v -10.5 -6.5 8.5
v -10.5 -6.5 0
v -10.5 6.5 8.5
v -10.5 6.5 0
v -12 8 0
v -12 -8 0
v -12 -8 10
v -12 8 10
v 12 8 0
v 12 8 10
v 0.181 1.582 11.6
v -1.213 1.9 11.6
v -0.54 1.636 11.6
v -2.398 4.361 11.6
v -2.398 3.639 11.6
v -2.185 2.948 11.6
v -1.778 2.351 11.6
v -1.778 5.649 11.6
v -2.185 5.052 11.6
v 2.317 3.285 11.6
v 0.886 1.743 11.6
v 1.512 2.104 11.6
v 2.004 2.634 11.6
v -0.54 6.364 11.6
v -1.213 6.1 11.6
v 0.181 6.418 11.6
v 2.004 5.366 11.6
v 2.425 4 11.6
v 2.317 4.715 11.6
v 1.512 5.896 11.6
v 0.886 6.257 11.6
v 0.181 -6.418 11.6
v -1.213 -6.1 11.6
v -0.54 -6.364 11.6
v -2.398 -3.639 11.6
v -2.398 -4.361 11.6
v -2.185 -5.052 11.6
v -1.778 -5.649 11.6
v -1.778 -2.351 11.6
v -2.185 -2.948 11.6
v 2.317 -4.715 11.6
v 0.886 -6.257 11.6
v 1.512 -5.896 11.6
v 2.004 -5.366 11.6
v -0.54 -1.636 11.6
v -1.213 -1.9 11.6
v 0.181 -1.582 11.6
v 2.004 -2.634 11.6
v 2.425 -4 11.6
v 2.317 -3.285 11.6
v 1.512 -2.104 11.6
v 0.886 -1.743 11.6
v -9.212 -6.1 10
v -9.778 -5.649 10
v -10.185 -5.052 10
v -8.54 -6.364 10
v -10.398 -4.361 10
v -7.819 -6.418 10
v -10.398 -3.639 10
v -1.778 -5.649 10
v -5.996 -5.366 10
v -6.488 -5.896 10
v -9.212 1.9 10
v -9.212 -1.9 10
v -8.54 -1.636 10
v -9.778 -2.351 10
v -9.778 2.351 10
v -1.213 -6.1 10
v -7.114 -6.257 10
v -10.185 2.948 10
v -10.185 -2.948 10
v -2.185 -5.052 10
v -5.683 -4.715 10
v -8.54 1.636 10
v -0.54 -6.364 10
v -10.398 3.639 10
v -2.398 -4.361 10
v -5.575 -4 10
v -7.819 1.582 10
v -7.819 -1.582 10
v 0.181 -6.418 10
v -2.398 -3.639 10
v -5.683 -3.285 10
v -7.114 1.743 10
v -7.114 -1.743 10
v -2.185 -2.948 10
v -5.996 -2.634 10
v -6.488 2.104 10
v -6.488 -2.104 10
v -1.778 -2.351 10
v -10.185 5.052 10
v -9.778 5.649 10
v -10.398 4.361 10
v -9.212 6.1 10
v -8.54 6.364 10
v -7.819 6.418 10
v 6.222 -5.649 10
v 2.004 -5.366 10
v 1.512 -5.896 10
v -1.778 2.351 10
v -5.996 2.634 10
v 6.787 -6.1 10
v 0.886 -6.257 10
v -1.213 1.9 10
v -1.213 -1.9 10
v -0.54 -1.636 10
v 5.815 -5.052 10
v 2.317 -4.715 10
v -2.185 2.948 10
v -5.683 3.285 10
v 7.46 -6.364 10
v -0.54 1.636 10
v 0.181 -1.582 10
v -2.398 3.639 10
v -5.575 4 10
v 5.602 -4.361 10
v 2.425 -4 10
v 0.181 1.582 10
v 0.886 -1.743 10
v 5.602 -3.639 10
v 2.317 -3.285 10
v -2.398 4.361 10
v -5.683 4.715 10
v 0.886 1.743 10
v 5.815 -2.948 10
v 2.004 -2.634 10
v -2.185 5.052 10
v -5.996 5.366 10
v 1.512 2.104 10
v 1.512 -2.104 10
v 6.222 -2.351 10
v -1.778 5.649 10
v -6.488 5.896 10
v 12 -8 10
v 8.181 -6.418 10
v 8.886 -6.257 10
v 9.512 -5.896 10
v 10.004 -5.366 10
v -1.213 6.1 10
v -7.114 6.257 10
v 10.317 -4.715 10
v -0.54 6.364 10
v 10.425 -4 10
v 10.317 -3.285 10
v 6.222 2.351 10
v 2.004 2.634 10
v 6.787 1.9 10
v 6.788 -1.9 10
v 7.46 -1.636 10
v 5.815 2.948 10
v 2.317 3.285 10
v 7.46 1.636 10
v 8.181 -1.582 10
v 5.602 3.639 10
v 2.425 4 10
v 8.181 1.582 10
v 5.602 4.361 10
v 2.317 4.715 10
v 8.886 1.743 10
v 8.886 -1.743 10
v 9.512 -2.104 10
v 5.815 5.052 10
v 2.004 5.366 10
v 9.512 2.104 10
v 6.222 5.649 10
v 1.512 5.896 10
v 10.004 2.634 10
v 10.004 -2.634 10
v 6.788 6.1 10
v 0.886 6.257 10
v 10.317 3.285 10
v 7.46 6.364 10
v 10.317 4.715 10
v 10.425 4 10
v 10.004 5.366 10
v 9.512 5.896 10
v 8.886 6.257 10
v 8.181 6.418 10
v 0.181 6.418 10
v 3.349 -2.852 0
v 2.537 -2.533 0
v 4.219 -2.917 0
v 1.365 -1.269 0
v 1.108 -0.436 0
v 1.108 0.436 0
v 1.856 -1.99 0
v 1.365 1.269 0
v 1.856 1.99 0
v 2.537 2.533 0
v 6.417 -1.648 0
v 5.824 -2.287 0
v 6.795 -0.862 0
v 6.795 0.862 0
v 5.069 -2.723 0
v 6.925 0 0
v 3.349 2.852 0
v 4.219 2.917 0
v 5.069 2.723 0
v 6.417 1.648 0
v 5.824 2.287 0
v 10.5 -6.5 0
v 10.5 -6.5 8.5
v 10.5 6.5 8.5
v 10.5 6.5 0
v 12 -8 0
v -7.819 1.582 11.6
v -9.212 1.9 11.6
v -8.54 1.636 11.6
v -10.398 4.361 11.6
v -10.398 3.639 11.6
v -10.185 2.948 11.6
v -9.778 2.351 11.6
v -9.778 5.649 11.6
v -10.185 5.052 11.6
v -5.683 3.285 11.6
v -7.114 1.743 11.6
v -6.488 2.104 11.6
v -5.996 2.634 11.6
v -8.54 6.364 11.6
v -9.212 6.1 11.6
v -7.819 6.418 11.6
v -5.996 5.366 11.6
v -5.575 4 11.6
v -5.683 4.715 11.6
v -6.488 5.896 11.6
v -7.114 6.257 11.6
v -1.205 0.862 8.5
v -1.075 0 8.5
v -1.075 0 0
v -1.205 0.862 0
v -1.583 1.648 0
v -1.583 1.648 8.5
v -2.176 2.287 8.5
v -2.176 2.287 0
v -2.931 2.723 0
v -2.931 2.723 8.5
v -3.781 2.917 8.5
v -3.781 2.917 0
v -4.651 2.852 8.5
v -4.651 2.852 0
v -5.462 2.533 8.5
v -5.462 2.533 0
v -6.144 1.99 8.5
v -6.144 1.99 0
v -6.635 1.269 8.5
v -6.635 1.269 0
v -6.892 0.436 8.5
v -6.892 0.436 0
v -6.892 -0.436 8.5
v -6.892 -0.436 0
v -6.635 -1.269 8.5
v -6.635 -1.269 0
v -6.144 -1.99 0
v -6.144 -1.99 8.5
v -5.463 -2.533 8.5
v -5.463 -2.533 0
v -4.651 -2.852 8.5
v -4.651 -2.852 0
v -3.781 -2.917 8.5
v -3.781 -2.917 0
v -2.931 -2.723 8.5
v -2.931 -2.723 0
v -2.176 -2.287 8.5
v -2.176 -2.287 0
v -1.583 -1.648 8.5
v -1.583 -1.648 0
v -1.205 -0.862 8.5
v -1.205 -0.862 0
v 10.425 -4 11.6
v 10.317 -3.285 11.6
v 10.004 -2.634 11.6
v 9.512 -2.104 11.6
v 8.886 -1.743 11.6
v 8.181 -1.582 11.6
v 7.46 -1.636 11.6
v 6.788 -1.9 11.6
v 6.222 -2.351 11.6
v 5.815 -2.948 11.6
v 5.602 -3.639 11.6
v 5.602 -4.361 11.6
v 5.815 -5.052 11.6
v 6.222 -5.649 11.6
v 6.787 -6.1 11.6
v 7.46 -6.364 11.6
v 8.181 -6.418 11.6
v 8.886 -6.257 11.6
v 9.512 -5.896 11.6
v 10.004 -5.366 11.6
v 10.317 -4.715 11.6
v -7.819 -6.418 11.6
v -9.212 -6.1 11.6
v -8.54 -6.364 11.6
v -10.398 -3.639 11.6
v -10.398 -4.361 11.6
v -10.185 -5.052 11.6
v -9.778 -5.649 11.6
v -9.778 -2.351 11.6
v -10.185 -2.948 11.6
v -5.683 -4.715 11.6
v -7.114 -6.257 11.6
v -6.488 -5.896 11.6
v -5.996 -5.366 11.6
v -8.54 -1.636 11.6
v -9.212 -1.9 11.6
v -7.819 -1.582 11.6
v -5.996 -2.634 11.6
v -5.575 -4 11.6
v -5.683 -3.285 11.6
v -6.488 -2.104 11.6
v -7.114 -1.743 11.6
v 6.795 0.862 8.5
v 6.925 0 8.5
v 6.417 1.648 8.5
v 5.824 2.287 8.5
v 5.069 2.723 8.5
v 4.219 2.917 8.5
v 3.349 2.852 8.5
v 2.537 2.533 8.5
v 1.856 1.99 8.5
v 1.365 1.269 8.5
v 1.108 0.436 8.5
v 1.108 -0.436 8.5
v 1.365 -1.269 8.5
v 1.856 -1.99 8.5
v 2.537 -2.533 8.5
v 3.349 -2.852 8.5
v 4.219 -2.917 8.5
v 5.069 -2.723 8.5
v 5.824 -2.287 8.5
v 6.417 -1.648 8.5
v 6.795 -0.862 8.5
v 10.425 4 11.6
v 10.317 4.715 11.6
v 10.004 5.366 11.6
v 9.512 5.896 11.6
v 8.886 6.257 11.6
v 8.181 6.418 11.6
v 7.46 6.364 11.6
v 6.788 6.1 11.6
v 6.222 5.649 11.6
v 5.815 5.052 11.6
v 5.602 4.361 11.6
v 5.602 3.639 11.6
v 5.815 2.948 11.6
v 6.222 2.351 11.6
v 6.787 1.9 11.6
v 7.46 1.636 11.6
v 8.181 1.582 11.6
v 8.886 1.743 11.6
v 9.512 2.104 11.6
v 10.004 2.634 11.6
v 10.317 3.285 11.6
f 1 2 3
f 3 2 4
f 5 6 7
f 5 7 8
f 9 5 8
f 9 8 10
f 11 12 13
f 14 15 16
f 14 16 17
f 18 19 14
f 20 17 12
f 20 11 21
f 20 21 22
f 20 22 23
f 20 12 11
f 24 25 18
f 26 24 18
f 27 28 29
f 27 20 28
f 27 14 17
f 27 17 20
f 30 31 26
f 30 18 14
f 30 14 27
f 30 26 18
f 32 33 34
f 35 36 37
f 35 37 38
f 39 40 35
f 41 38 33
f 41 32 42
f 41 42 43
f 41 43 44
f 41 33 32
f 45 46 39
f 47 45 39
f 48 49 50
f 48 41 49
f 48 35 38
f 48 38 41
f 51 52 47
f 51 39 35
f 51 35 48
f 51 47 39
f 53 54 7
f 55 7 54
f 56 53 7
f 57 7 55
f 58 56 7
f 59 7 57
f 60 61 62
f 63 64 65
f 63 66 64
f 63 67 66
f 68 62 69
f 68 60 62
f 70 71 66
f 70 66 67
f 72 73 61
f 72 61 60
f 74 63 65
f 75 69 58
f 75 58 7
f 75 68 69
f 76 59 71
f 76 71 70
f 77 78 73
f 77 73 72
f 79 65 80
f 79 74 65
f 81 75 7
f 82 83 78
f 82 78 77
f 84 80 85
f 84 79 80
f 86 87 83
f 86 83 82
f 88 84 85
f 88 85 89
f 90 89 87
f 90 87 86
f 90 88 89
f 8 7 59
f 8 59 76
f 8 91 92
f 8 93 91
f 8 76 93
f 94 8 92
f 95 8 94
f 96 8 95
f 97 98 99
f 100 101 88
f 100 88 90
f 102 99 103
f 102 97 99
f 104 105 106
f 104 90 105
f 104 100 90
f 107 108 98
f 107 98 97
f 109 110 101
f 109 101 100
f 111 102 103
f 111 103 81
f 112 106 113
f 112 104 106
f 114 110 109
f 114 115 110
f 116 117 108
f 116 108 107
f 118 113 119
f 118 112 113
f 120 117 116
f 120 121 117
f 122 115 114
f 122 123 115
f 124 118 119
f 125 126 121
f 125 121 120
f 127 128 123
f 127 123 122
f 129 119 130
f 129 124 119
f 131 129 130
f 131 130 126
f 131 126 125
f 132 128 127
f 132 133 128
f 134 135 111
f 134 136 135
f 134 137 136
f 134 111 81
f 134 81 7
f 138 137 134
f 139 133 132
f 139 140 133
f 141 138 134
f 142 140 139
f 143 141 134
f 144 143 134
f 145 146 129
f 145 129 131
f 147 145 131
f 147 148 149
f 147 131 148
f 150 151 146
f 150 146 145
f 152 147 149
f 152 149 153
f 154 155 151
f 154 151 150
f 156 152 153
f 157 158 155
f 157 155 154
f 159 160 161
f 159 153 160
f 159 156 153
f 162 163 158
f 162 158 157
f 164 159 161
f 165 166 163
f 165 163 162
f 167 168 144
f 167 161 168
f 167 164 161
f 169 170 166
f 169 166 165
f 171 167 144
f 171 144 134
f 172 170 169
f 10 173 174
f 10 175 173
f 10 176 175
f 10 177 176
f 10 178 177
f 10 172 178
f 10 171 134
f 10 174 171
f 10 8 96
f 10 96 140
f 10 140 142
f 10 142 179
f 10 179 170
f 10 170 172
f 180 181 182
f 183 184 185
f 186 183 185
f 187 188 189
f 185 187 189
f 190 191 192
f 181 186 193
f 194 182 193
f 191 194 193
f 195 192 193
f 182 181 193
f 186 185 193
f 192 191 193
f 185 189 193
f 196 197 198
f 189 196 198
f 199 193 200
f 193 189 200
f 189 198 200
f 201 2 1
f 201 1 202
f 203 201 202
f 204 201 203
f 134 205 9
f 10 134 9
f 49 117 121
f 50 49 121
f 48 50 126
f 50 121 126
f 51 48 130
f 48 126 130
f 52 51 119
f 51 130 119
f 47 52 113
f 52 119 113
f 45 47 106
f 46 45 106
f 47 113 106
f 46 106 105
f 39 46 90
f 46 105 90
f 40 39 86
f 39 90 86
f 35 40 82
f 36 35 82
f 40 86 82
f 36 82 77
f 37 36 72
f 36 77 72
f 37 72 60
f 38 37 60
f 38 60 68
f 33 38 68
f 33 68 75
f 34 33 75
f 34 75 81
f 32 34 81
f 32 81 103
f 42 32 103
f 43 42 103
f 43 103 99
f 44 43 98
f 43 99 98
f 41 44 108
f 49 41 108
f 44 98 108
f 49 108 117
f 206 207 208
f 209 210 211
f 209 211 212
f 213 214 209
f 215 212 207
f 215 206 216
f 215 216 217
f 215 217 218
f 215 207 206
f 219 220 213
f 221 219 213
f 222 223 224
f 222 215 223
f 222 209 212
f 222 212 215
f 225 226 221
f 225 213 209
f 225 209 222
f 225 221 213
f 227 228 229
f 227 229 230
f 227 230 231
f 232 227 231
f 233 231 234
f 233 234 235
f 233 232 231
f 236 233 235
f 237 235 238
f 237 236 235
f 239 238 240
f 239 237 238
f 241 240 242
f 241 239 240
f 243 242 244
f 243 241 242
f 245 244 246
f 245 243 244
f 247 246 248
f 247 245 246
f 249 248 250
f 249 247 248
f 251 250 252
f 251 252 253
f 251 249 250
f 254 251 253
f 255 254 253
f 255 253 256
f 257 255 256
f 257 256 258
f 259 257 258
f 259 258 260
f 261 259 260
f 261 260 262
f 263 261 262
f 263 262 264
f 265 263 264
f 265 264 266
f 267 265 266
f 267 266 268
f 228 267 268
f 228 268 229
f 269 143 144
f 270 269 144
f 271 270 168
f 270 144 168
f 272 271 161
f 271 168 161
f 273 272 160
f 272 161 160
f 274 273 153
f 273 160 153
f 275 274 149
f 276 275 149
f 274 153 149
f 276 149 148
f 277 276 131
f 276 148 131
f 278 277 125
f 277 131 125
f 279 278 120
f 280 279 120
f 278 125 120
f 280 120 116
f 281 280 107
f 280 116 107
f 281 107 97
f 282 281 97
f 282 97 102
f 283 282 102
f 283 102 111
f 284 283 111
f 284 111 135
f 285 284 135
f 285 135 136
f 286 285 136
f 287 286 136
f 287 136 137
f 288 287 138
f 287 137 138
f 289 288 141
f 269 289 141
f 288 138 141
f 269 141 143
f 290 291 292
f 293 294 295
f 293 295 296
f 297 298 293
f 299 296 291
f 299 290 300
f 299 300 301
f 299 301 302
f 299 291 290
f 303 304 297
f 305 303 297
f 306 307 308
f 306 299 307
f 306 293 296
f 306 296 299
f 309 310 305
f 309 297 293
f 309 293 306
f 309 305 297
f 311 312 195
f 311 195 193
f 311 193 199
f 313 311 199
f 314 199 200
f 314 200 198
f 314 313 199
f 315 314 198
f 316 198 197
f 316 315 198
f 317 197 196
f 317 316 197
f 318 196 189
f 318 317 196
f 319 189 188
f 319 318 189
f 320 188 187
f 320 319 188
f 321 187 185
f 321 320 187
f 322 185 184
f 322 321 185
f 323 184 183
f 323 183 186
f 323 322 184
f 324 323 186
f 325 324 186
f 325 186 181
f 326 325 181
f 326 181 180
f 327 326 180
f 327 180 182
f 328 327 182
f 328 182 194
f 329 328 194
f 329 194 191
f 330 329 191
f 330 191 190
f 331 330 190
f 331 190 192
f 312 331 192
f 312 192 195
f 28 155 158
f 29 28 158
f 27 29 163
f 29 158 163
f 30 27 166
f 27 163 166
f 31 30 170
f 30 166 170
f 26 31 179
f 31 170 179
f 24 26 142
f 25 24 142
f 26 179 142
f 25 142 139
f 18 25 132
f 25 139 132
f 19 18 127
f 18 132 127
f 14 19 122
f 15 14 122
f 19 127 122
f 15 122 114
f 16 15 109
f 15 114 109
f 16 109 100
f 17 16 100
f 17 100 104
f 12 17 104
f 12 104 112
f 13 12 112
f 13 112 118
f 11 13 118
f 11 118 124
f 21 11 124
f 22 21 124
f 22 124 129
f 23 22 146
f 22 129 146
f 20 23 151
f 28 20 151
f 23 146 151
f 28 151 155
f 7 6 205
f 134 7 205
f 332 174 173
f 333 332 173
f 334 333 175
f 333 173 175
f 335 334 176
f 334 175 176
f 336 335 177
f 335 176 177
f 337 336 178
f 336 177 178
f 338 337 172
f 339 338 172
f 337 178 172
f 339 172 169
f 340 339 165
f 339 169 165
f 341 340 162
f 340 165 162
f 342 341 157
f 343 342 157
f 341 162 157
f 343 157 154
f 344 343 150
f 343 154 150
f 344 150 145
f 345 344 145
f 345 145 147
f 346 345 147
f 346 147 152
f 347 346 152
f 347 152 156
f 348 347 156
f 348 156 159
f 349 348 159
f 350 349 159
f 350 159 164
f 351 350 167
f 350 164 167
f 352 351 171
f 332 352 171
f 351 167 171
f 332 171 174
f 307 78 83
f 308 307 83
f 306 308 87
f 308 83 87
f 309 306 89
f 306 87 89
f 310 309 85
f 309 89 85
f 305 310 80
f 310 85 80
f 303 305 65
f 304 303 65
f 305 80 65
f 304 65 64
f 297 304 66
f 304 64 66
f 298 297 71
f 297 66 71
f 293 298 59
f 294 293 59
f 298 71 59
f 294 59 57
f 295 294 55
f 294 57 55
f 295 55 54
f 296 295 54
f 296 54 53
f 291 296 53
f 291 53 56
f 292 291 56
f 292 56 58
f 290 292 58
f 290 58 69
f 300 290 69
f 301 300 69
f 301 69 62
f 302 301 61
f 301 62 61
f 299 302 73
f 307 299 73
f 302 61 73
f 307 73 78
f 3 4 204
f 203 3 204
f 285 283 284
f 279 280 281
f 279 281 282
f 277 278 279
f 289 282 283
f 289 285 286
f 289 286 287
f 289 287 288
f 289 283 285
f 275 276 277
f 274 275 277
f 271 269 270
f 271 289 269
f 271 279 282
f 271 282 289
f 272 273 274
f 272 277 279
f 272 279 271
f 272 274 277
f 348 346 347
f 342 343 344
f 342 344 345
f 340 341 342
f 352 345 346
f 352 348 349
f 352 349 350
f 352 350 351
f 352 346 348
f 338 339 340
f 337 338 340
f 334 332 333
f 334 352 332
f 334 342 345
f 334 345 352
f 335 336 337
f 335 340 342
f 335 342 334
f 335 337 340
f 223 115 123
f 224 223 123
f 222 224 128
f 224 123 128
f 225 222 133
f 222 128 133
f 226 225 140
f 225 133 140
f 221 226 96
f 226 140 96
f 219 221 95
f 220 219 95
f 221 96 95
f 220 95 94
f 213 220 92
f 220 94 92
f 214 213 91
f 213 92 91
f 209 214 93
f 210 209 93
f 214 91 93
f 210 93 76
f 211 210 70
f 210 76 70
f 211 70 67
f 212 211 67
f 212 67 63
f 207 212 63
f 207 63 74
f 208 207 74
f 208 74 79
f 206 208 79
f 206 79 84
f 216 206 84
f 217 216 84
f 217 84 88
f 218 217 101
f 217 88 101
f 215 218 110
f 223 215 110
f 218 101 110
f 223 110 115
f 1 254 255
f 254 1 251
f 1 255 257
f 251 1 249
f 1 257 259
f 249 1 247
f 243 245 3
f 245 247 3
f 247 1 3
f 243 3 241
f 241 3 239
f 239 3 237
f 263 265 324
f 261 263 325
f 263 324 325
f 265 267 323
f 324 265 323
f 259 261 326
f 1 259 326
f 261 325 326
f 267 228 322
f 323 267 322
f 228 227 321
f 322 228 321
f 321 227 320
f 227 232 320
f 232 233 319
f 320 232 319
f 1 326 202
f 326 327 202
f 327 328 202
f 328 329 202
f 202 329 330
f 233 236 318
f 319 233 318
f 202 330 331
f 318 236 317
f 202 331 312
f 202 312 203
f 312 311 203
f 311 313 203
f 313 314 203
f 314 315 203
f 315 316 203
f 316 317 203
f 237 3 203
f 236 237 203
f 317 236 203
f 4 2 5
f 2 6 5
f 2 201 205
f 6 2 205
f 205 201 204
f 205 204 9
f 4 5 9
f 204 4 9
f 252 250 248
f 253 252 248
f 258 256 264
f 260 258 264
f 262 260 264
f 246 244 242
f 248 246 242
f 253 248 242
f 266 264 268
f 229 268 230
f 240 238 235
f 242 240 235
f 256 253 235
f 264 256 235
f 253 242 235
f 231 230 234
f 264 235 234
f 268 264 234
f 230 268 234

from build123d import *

# Parameters (mm, degrees)
F0_W     = 24
F0_H     = 16
F1_DEPTH = 10
F2_T     = -1.5
F3_R     = 2.425
F4_DEPTH = 1.6
F5_R     = 2.925
F6_DEPTH = 10


with BuildPart() as f1:
    # F0 (on Top) → F1 (new body)
    with BuildSketch(Plane.XY):
        Rectangle(F0_W, F0_H)
    extrude(amount=F1_DEPTH)

    # F2
    f2_openings = [f1.faces().sort_by_distance(p)[0] for p in [
        (0, 0, 0),
    ]]
    offset(amount=F2_T, openings=f2_openings)

    # F3 (on face) → F4 (join)
    with BuildSketch(Plane.XY.offset(10)):
        with Locations((-8, -4)):
            Circle(F3_R)
        with Locations((-8, 4)):
            Circle(F3_R)
        with Locations((0, -4)):
            Circle(F3_R)
        with Locations((0, 4)):
            Circle(F3_R)
        with Locations((8, -4)):
            Circle(F3_R)
        with Locations((8, 4)):
            Circle(F3_R)
    extrude(amount=F4_DEPTH)

    # F5 (on face) → F6 (join)
    with BuildSketch(Plane.XY.offset(10)):
        with Locations((-4, 0)):
            Circle(F5_R)
        with Locations((4, 0)):
            Circle(F5_R)
    extrude(amount=-F6_DEPTH)


solid = f1.part
